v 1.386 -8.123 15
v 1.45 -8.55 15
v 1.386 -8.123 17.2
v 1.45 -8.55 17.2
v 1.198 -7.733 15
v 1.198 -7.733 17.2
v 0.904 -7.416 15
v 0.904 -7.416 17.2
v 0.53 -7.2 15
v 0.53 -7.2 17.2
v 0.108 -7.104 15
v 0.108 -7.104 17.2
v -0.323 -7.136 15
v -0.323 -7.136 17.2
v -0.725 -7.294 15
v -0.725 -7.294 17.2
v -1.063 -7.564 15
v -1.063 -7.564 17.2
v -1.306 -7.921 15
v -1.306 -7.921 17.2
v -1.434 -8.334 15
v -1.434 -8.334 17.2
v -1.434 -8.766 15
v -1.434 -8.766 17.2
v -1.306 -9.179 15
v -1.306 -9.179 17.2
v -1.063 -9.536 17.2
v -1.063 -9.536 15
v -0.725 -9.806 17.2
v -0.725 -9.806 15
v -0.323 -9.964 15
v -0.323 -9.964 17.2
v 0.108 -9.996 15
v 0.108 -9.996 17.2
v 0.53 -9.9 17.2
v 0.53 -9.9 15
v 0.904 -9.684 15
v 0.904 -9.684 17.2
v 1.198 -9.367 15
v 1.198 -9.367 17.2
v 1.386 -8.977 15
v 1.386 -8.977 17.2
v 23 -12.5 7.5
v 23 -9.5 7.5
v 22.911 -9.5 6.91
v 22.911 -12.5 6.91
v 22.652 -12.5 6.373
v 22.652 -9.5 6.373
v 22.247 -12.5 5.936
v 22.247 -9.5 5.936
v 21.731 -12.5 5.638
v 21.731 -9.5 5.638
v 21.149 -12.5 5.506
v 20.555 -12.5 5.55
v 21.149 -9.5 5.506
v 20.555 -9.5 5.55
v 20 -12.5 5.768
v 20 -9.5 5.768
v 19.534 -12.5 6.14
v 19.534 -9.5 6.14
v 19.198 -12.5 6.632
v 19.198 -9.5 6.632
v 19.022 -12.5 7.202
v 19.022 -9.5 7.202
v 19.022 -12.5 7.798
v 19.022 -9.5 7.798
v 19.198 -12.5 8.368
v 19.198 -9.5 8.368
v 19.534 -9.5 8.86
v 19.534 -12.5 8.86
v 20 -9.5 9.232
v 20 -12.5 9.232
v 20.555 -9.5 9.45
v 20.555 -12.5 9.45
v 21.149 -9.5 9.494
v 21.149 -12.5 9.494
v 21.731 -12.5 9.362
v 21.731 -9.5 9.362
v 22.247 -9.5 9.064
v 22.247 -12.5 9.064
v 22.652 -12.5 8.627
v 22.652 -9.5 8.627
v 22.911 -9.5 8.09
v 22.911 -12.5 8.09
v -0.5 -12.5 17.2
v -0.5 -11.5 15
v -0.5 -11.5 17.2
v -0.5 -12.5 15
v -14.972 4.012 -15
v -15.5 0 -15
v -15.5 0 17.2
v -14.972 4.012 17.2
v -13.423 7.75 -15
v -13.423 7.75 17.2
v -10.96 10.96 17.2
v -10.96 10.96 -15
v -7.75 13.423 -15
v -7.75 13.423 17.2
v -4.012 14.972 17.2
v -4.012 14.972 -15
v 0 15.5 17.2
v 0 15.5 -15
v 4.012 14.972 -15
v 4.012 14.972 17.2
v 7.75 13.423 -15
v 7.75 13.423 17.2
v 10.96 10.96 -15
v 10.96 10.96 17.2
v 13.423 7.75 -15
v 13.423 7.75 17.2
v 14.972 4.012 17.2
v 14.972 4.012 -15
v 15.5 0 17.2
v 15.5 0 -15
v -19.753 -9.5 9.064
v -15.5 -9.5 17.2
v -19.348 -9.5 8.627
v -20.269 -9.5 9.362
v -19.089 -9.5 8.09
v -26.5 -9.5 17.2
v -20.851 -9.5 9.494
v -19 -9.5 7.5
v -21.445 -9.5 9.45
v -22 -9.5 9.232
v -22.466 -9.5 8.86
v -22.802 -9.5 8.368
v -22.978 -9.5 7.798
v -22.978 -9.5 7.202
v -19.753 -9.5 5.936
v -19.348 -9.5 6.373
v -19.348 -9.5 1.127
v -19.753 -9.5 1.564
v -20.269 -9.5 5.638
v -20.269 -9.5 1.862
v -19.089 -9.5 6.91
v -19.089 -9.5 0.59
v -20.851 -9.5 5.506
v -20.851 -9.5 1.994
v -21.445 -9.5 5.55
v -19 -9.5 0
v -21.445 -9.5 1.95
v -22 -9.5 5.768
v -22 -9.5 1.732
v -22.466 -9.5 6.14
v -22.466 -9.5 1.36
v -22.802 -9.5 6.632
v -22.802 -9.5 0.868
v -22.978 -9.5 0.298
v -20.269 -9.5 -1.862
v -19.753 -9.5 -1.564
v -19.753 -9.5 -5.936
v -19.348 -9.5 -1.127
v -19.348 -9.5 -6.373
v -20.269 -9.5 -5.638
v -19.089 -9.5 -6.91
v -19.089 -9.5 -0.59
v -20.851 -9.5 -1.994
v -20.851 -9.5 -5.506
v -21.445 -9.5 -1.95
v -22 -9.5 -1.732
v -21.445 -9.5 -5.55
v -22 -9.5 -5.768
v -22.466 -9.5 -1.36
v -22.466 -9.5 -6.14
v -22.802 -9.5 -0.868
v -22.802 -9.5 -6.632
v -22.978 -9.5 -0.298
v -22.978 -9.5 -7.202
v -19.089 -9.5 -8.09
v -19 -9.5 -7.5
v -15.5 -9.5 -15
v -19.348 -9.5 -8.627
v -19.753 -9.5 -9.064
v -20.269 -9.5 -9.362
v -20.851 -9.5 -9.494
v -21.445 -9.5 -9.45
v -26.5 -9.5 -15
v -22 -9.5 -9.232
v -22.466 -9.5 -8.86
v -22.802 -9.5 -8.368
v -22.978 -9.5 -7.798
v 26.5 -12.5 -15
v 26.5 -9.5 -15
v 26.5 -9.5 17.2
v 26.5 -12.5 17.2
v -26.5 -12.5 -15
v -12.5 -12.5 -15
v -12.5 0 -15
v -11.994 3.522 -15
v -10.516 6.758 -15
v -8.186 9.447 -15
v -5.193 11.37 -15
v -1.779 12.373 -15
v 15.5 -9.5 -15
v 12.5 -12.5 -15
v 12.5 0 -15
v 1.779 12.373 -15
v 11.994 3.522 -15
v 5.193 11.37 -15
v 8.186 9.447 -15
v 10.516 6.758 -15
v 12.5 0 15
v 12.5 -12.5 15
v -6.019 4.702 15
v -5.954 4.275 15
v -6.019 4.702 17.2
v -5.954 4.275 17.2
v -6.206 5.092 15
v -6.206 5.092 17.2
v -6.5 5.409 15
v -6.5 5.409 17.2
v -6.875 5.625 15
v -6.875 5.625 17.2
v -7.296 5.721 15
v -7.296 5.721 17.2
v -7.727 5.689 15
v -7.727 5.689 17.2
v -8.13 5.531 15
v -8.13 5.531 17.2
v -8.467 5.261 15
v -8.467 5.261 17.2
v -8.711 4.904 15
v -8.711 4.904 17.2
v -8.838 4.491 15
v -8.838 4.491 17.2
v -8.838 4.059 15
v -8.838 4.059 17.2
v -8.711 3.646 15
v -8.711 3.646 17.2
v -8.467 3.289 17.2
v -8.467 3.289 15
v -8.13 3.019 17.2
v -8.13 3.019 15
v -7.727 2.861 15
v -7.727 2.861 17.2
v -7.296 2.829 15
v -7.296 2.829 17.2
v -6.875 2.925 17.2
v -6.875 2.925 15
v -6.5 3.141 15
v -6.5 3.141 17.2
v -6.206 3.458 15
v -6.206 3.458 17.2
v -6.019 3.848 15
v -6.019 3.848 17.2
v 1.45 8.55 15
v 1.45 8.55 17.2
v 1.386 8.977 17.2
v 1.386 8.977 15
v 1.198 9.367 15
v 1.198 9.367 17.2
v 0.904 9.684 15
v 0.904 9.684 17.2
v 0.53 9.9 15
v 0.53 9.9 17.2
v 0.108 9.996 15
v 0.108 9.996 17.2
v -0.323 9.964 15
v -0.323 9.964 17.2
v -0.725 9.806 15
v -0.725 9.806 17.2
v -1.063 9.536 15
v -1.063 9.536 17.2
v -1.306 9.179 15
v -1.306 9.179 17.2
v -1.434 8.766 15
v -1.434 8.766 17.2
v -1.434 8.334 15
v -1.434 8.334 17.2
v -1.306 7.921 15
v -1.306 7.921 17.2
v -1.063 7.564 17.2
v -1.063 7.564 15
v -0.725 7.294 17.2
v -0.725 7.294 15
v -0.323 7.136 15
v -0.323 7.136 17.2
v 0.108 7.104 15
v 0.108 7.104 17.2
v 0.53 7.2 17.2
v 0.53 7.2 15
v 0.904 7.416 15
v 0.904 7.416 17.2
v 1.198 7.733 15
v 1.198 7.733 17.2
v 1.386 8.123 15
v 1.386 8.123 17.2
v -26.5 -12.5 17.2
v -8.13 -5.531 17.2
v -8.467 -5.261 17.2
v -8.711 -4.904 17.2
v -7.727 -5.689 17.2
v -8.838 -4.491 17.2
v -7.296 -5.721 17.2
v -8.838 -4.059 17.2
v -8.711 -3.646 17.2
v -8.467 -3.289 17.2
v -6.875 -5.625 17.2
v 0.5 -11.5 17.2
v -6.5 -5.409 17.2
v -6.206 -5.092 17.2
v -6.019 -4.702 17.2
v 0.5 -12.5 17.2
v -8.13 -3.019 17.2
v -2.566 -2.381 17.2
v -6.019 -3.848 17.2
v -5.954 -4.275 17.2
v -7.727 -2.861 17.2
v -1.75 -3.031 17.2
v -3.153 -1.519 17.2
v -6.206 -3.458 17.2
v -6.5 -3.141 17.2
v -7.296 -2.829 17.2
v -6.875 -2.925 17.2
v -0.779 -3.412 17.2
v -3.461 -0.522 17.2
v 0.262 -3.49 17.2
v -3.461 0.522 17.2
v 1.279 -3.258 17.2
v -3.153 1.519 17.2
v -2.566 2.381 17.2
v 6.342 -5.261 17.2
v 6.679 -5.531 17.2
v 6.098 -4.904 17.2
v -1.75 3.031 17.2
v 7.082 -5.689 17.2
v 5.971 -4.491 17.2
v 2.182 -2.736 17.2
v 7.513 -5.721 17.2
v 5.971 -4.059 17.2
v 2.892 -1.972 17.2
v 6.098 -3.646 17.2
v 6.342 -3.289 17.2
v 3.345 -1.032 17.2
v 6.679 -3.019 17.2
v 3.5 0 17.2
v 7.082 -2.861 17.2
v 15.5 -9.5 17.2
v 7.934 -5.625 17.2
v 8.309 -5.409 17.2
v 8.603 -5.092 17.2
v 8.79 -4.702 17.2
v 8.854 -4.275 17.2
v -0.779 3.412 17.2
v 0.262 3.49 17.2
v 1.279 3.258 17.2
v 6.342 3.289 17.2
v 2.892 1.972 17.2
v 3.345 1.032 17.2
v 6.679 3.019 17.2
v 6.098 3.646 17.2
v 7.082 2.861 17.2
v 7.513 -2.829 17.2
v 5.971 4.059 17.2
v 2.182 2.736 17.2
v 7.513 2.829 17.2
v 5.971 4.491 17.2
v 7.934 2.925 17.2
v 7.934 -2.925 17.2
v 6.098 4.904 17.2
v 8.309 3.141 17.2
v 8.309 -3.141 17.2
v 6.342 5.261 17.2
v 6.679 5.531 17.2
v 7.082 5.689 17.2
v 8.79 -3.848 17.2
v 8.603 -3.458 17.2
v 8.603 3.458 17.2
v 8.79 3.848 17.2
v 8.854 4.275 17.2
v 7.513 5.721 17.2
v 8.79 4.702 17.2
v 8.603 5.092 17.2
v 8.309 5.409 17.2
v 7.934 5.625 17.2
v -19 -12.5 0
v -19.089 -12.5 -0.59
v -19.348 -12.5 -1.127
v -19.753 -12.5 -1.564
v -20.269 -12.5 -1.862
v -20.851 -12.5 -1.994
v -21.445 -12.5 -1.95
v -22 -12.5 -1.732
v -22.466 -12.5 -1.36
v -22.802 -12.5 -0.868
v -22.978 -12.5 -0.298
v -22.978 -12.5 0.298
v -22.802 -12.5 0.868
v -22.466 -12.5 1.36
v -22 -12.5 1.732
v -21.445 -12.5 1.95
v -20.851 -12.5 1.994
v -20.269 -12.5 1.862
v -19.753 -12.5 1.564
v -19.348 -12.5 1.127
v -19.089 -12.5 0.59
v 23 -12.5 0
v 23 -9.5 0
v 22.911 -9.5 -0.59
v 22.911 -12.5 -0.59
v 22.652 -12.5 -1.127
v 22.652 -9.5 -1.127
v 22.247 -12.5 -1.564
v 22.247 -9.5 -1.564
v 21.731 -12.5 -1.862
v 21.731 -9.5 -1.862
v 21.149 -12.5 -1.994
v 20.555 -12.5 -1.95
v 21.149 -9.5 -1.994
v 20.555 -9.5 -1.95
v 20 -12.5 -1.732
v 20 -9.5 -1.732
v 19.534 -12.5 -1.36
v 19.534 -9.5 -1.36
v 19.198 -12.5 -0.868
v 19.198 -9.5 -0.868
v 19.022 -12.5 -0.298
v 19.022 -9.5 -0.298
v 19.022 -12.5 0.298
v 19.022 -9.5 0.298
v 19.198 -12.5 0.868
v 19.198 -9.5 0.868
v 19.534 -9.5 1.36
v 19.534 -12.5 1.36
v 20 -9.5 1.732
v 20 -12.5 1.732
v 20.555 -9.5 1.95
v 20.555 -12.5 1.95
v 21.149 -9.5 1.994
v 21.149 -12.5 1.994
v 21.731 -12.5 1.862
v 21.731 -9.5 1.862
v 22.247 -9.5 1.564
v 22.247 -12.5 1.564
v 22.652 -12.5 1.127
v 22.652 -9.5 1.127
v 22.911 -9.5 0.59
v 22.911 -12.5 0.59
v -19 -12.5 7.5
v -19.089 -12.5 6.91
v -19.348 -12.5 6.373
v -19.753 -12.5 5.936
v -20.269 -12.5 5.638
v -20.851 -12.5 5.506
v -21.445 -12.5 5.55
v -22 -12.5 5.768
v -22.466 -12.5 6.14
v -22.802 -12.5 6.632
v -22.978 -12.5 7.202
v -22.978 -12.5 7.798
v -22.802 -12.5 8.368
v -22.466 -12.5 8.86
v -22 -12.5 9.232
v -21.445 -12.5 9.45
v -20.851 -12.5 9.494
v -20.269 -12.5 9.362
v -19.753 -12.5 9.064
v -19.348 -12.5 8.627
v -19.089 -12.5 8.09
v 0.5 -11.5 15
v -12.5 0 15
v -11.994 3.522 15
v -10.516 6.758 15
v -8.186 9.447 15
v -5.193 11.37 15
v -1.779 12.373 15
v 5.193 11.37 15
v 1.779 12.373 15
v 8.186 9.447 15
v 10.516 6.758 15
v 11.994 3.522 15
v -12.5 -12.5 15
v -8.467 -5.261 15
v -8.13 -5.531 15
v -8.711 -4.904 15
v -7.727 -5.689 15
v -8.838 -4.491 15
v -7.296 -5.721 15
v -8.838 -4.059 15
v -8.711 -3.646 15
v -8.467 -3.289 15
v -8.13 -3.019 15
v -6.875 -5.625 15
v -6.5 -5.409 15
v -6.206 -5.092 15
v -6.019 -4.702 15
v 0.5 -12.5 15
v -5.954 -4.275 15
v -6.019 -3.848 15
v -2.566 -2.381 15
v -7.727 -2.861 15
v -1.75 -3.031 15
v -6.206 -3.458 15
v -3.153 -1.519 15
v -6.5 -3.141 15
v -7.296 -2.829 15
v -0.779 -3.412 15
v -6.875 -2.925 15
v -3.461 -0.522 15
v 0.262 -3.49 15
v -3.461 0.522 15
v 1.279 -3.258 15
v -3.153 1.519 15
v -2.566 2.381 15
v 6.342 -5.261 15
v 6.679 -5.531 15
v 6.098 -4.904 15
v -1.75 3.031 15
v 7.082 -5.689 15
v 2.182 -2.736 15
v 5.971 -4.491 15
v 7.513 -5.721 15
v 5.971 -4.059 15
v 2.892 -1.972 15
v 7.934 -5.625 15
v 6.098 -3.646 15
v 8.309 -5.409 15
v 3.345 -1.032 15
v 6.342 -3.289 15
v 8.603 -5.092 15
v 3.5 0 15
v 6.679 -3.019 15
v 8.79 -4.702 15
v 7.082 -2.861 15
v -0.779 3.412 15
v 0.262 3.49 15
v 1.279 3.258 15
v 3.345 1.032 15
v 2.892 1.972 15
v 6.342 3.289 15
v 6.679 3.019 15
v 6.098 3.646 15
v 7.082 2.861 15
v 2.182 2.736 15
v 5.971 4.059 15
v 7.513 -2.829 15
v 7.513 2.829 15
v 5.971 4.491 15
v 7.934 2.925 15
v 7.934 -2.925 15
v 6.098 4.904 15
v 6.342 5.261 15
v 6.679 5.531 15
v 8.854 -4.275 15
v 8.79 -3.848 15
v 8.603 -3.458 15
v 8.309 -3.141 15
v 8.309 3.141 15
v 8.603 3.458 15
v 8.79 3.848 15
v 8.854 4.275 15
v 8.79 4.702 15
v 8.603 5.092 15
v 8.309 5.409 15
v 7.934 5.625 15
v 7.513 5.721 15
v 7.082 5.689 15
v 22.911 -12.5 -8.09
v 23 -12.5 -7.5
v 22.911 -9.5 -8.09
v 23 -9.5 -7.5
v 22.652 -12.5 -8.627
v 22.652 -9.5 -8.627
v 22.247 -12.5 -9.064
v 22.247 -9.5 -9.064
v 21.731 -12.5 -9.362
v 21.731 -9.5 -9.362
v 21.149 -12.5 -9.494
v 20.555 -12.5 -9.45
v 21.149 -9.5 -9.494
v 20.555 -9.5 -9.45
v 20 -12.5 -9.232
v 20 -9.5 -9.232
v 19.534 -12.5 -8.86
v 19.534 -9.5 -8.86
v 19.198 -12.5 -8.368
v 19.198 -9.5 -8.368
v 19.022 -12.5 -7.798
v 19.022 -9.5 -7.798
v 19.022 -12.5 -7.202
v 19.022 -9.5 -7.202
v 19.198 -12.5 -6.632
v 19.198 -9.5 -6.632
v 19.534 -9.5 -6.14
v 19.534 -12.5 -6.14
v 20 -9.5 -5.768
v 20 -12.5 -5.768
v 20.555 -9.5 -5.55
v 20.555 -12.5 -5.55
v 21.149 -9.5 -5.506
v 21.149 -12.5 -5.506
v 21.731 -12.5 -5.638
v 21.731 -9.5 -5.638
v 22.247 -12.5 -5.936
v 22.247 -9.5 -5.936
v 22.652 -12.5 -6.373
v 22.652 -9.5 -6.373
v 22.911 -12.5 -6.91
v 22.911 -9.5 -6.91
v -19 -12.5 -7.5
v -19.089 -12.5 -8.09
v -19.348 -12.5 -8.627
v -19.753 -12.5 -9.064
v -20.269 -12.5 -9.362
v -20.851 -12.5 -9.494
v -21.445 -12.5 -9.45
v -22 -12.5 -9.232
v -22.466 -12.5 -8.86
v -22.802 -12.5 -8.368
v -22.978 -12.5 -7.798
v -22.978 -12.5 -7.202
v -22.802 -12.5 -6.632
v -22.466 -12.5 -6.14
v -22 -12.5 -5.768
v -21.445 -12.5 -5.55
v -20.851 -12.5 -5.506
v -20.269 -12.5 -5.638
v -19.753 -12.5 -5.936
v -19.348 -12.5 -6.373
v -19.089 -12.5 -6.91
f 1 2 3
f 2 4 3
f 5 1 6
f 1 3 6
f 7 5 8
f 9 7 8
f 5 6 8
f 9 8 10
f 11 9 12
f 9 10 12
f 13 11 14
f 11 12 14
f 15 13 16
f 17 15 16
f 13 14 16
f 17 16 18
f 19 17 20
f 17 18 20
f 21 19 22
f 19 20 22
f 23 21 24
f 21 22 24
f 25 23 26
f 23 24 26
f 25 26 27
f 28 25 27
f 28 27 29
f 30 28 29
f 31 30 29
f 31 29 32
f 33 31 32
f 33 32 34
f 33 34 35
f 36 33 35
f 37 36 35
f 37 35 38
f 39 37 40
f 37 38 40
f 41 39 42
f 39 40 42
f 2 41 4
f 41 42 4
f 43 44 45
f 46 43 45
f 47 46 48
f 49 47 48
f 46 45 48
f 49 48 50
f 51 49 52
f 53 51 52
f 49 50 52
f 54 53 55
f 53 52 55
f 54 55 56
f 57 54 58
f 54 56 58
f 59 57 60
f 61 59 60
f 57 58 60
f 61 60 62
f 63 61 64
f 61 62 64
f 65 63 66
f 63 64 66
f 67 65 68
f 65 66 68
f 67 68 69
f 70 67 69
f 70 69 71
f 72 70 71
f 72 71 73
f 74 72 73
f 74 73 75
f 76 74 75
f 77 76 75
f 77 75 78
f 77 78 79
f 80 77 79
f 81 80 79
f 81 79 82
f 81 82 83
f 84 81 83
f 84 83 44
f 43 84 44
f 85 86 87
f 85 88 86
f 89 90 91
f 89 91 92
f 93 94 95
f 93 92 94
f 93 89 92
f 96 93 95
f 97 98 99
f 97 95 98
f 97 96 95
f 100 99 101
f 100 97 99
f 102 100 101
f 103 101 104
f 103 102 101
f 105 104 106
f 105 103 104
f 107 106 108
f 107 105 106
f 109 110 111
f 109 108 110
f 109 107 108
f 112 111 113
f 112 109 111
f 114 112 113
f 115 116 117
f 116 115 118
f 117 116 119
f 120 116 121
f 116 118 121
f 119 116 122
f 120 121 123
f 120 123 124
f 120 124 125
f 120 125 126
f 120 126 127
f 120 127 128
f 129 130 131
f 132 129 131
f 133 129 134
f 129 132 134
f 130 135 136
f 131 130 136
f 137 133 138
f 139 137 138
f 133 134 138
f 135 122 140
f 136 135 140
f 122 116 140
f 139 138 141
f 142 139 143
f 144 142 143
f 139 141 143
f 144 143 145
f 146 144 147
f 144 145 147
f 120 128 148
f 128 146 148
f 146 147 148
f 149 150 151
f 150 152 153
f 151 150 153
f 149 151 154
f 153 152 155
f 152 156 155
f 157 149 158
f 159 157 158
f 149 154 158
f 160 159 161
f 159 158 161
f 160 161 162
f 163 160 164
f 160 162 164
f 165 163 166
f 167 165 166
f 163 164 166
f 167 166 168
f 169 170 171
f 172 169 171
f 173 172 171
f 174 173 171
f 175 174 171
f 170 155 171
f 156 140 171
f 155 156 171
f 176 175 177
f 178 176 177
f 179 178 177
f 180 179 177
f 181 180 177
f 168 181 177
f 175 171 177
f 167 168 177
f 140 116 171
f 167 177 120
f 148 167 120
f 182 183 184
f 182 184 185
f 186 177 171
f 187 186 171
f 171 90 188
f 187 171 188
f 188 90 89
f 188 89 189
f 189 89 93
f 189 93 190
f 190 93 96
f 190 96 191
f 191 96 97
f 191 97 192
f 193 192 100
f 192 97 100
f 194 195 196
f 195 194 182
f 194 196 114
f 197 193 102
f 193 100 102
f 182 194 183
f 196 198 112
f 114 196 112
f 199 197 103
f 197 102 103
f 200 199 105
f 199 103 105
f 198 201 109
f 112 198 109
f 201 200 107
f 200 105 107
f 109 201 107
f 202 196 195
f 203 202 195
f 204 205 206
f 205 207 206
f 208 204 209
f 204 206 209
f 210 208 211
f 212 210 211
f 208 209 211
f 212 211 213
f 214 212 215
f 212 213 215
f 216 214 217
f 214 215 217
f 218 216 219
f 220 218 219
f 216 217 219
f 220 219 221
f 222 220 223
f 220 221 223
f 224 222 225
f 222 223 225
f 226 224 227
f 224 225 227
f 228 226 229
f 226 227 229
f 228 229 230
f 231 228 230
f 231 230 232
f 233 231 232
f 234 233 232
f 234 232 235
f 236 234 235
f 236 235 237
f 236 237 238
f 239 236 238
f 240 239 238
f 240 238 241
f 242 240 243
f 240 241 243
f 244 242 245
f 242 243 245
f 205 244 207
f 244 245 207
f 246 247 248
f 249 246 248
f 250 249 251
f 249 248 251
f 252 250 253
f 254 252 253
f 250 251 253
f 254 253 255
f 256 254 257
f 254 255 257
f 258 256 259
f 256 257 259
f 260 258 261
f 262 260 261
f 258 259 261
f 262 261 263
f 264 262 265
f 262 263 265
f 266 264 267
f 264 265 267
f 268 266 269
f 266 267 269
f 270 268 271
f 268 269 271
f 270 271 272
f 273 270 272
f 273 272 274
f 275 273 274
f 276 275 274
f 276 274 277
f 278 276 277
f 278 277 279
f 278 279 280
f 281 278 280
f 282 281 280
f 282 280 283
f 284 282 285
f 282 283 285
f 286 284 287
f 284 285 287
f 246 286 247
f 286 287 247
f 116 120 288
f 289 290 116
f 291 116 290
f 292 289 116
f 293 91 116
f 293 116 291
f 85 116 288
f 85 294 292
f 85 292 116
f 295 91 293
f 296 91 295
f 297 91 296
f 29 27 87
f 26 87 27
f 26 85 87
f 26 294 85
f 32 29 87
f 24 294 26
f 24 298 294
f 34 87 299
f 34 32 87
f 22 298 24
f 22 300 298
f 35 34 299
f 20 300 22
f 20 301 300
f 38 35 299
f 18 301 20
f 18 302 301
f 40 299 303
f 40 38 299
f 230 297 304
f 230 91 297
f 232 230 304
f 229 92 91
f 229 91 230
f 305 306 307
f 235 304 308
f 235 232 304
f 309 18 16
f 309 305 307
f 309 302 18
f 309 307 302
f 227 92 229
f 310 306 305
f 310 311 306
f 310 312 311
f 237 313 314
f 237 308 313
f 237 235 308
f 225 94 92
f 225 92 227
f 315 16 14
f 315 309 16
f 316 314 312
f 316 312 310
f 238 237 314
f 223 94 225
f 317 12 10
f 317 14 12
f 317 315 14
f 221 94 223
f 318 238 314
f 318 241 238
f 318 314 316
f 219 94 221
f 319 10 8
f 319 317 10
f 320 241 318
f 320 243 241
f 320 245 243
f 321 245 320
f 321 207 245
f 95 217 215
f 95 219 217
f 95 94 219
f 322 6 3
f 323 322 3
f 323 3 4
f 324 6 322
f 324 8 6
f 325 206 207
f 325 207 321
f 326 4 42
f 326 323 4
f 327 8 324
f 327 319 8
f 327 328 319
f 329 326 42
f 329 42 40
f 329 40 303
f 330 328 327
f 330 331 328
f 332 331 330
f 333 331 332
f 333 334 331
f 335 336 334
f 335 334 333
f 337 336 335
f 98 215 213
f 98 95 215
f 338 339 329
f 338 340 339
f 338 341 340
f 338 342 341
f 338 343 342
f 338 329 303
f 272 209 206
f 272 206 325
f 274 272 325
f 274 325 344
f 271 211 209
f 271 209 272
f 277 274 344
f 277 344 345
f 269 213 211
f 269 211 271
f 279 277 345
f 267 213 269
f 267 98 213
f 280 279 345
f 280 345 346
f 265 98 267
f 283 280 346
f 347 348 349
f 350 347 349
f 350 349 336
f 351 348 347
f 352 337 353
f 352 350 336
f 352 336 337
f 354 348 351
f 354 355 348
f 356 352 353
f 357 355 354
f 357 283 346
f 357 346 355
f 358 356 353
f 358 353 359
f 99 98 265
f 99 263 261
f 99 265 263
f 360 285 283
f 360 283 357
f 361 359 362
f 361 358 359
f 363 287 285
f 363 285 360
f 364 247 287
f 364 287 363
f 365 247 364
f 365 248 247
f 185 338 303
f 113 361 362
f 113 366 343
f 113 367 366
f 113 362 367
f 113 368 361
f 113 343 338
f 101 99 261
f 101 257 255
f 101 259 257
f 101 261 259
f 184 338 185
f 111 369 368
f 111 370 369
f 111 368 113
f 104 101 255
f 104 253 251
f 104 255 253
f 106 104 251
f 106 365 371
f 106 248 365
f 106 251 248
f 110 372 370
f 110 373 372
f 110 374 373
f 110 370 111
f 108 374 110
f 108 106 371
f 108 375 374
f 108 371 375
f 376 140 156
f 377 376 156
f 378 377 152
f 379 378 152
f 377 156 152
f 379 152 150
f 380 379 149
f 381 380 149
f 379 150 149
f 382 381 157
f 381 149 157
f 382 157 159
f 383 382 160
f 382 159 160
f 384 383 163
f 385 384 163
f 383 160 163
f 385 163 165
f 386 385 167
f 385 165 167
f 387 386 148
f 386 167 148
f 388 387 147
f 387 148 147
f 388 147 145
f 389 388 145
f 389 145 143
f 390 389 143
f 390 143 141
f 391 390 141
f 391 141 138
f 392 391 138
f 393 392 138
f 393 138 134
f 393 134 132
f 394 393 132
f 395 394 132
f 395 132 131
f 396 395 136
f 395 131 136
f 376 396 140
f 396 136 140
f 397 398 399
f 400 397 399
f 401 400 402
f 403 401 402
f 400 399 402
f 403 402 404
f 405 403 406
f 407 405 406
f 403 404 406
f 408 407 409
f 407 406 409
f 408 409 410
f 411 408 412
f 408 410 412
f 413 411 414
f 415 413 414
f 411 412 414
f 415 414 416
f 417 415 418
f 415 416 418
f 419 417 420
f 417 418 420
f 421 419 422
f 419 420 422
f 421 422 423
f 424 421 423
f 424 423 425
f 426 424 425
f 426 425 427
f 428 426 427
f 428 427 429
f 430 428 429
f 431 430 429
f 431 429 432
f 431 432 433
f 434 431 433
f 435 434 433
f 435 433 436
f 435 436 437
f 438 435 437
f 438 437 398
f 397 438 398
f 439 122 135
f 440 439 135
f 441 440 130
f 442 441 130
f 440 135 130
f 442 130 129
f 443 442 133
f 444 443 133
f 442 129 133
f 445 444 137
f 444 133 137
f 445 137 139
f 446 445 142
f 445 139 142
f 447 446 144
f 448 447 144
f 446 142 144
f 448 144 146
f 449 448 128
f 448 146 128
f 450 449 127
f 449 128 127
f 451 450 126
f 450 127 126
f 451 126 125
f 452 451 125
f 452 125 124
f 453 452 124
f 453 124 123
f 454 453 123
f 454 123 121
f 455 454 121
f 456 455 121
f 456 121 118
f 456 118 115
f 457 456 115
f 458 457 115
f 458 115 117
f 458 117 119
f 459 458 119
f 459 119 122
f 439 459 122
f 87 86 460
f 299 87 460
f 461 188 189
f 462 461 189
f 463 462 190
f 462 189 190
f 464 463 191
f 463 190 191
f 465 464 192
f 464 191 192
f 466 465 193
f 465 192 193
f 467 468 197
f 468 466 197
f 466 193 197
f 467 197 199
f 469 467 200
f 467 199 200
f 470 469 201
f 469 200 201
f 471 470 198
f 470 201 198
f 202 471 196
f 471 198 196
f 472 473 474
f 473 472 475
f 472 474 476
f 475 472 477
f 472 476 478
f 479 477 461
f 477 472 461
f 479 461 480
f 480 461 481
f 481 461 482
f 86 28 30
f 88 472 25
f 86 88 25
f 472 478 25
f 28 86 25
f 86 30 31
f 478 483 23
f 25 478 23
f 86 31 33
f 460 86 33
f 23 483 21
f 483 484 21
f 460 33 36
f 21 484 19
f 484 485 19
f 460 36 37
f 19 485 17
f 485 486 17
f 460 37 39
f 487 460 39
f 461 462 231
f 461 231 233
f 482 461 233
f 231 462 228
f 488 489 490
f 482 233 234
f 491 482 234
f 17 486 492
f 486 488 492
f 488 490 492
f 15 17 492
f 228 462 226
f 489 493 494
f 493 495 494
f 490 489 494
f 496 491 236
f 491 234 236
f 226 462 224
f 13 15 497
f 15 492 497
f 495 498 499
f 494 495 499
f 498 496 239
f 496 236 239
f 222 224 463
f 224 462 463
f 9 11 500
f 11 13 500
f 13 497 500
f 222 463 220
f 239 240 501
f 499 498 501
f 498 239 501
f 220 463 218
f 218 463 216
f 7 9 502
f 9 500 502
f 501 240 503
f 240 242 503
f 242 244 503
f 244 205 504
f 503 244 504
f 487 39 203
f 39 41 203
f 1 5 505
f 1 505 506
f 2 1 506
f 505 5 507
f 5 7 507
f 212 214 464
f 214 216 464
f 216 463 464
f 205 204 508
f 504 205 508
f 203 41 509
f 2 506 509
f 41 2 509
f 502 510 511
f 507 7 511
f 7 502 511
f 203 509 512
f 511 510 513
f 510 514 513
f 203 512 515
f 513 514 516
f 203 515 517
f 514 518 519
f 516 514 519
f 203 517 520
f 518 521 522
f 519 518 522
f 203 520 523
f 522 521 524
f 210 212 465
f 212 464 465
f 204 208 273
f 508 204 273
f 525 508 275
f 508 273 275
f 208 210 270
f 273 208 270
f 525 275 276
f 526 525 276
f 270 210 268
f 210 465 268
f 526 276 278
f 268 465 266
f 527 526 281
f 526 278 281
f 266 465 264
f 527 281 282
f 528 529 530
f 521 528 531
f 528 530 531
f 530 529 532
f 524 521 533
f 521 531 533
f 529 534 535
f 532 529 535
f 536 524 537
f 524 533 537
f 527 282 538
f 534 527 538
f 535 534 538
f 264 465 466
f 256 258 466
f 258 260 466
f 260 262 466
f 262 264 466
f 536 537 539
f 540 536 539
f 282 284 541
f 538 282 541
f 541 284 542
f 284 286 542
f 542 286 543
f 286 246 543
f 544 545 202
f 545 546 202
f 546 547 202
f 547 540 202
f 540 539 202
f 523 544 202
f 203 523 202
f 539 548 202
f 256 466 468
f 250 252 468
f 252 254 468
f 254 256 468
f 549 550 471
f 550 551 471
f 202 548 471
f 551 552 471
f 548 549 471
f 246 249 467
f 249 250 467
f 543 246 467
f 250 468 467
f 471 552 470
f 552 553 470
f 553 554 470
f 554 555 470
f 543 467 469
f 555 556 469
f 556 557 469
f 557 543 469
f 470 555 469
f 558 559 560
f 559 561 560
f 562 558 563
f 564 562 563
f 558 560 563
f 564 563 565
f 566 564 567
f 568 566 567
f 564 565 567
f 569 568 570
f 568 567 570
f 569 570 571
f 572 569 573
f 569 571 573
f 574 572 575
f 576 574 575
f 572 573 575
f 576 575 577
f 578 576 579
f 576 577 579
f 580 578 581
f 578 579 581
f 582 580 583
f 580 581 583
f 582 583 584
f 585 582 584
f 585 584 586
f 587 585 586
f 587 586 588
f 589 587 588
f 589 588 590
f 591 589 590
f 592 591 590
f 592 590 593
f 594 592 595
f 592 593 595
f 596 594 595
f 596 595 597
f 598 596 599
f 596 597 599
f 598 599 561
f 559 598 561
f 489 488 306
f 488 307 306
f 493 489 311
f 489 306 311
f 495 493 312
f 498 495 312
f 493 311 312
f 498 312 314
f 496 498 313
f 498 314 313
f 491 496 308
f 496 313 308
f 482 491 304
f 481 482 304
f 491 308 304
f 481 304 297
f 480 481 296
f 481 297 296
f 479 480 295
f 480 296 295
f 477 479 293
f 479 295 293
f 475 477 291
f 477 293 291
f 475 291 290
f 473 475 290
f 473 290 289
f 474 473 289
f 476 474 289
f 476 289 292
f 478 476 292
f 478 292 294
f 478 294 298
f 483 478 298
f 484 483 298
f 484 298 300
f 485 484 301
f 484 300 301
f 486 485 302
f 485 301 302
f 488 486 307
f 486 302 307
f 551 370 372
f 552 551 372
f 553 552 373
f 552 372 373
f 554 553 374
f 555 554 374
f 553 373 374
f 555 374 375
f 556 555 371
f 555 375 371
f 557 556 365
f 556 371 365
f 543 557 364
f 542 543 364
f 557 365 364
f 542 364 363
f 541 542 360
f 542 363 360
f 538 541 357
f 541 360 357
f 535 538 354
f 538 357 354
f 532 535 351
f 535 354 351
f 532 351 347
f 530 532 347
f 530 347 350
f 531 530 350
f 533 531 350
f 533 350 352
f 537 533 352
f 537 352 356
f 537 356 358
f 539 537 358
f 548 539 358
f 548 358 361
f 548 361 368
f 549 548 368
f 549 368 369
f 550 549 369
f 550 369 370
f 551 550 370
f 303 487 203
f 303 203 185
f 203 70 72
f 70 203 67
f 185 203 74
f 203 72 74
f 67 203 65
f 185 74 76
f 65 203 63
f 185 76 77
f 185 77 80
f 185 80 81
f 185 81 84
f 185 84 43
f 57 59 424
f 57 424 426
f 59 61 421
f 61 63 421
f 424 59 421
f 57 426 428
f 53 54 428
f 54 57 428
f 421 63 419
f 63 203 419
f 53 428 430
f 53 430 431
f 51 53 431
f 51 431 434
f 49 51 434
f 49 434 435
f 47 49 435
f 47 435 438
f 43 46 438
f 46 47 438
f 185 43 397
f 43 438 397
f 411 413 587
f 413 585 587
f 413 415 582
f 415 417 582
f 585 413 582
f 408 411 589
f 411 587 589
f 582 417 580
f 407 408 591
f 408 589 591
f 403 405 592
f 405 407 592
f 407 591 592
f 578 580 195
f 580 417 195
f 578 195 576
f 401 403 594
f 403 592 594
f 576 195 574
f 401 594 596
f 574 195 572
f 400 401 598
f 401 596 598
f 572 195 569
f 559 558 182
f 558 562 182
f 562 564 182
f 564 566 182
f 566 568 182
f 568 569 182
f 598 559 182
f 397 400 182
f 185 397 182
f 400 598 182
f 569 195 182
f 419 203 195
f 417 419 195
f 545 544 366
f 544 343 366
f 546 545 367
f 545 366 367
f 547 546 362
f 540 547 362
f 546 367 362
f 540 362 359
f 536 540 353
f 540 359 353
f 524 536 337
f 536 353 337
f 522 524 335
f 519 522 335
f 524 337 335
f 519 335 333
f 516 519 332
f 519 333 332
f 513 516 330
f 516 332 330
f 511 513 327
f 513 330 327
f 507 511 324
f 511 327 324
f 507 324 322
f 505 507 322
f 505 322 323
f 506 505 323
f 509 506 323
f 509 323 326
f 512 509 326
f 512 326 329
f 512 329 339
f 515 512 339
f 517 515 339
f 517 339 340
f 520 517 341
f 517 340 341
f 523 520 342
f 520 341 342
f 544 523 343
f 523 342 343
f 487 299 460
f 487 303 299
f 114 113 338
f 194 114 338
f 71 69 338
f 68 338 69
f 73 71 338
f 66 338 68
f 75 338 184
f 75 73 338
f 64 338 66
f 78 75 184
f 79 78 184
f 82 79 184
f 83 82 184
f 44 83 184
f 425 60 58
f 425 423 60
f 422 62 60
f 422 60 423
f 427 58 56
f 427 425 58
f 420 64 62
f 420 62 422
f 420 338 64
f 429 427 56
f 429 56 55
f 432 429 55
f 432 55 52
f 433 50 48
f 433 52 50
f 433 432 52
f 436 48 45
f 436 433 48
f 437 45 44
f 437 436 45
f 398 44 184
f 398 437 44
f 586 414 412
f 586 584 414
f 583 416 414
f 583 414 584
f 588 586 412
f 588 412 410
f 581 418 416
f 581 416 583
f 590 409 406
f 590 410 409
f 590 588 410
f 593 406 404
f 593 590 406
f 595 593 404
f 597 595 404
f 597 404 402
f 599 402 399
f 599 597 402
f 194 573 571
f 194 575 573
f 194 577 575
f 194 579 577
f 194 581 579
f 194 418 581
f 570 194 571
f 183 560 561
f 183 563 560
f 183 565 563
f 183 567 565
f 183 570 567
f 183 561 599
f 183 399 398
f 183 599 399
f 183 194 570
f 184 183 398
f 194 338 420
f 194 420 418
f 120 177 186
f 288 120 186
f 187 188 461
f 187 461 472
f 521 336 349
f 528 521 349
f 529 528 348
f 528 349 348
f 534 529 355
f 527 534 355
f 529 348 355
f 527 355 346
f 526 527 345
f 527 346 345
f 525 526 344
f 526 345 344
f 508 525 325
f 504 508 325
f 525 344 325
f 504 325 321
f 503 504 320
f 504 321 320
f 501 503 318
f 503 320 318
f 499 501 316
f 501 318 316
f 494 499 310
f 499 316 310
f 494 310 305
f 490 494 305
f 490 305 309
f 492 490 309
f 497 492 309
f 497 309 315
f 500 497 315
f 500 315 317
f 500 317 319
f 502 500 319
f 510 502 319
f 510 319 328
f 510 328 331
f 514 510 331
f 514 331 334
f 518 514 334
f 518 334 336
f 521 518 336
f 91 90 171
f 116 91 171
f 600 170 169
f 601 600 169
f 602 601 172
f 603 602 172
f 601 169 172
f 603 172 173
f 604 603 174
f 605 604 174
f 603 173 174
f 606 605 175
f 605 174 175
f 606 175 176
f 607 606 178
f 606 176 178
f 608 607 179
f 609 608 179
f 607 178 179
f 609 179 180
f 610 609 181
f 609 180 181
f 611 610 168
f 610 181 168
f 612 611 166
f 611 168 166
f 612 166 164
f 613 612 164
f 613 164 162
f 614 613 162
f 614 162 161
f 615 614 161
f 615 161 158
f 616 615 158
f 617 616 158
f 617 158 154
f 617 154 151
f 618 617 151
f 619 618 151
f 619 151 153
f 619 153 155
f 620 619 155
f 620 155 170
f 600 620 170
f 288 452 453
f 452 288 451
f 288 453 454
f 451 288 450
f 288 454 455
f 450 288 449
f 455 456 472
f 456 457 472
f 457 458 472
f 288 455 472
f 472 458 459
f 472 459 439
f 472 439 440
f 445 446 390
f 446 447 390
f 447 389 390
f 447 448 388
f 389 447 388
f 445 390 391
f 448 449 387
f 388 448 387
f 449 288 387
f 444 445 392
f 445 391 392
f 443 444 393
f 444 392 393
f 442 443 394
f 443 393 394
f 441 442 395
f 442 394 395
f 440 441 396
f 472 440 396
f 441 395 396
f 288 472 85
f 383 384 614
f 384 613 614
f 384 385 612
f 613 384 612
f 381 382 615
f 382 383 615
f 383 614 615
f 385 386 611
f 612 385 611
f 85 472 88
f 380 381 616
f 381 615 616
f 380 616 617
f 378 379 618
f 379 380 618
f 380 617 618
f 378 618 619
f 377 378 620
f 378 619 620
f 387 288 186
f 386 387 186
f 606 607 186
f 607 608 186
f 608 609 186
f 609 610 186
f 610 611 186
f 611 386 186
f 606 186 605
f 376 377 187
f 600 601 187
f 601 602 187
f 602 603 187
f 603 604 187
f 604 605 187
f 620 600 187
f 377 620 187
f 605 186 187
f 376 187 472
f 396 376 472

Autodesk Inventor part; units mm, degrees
ref_plane "YZ Plane" through (0, 0, 0) normal (1, 0, 0) x (0, 1, 0)
ref_plane "XZ Plane" through (0, 0, 0) normal (0, 1, 0) x (-1, 0, 0)
ref_plane "XY Plane" through (0, 0, 0) normal (0, 0, 1) x (1, 0, 0)
sketch "Эскиз1" plane through (0, 0, 0) normal (0, 0, 1) x (1, 0, 0)
  arc A0 (12.5, 0) -> (-12.5, 0) centre (0, 0) ccw
  line L0 (-14, -15) -> (14, 15) construction
  line L1 (14, -15) -> (-14, 15) construction
  line L2 (-14, 0) -> (14, 0) construction
  line L3 (-12.5, 0) -> (-12.5, -12.5)
  line L4 (12.5, 0) -> (12.5, -12.5)
  line L5 (-14, -12.5) -> (-12.5, -12.5)
  line L6 (12.5, -12.5) -> (14, -12.5)
  arc A1 (-12.5, 0) -> (12.5, 0) centre (0, 0) ccw construction
  line L7 (-16.5, 17.6786) -> (16.5, -17.6786) construction
  line L8 (16.5, 17.6786) -> (-16.5, -17.6786) construction
  line L9 (-16.5, -12.5) -> (-12.5, -12.5)
  line L10 (12.5, -12.5) -> (16.5, -12.5)
  arc A2 (-12.2571, 13.1326) -> (-12.5, 12.8766) centre (-1.5, 2.6786) ccw
  line L11 (16.5, -12.5) -> (26.5, -12.5)
  line L12 (0, 24.347) -> (0, -20.4254) construction
  line L13 (-16.5, -12.5) -> (-26.5, -12.5)
  line L14 (-15.5, -9.5) -> (-15.5, 0)
  arc A3 (15.5, 0) -> (-15.5, 0) centre (0, 0) ccw
  line L15 (15.5, 0) -> (15.5, -9.5)
  line L16 (-12.5, -12.5) -> (-12.5, -9.5)
  line L17 (-26.5, -12.5) -> (-12.5, -12.5)
  line L18 (-12.5, -12.5) -> (-12.5, -9.5)
  line L19 (-15.5, -9.5) -> (-26.5, -9.5)
  line L20 (-26.5, -9.5) -> (-26.5, -12.5)
  line L21 (12.5, -12.5) -> (26.5, -12.5)
  line L22 (26.5, -12.5) -> (26.5, -9.5)
  line L23 (26.5, -9.5) -> (15.5, -9.5)
  line L24 (12.5, -9.5) -> (12.5, -12.5)
  point P0 (0, 17.6786)
  dimension "d0" = 25
  dimension "d5" = 15
  dimension "d38" = 3
  dimension "d39" = 3
extrude "Выдавливание1" add sketch "Эскиз1" along normal mid plane 30
sketch "Эскиз7" plane through (-26.5, -9.5, 15) normal (0, 1, 0) x (1, 0, 0)
  line L0 (0, 15) -> (11, 15) construction
  line L1 (11, 30) -> (11, 0) construction
  line L2 (5.5, 0) -> (5.5, 30) construction
  line L3 (0, 30) -> (11, 30) construction
  line L4 (0, 7.5) -> (11, 7.5) construction
  line L5 (0, 22.5) -> (11, 22.5) construction
  circle A0 centre (5.5, 7.5) radius 2
  line L6 (0, 0) -> (0, 30)
  line L7 (0, 30) -> (0, 0) projected
  circle A1 centre (5.5, 15) radius 2
  circle A2 centre (5.5, 22.5) radius 2
  line L8 (26.5, 38.2442) -> (26.5, 0)
  line L9 (53, 15) -> (42, 15) construction
  line L10 (42, 30) -> (42, 0) construction
  line L11 (47.5, 0) -> (47.5, 30) construction
  line L12 (53, 30) -> (42, 30) construction
  line L13 (53, 7.5) -> (42, 7.5) construction
  line L14 (53, 22.5) -> (42, 22.5) construction
  circle A3 centre (47.5, 7.5) radius 2
  circle A4 centre (47.5, 15) radius 2
  circle A5 centre (47.5, 22.5) radius 2
  point P0 (26.5, 15)
  dimension "d40" = 4
  dimension "d41" = 4
  dimension "d42" = 4
extrude "Выдавливание7" cut sketch "Эскиз7" against normal blind 10
sketch "Эскиз8" plane through (0, 0, 15) normal (0, 0, 1) x (1, 0, 0)
  line L0 (-15.5, -9.5) -> (15.5, -9.5)
split_face "Разделение1"
sketch "Эскиз9" plane through (0, 0, 15) normal (0, 0, 1) x (1, 0, 0)
  arc A0 (15.5, 0) -> (-15.5, 0) centre (0, 0) ccw
  line L0 (-15.5, 0) -> (-15.5, -9.5)
  line L1 (15.5, 0) -> (15.5, -9.5)
  line L2 (12.5, -12.5) -> (26.5, -12.5) projected
  line L3 (-15.5, -9.5) -> (-26.5, -9.5)
  line L4 (-26.5, -9.5) -> (-26.5, -12.5)
  line L5 (-26.5, -12.5) -> (-12.5, -12.5)
  line L6 (15.5, -9.5) -> (26.5, -9.5)
  line L7 (26.5, -9.5) -> (26.5, -12.5)
  line L8 (-12.5, -12.5) -> (12.5, -12.5)
  point P0 (-12.5, 0)
  point P1 (12.5, 0)
  point P2 (-12.5, -9.5)
extrude "Выдавливание8" add sketch "Эскиз9" along normal blind 2.2
sketch "Эскиз10" plane through (0, 0, 17.2) normal (0, 0, 1) x (1, 0, 0)
  arc A0 (12.5, 0) -> (-12.5, 0) centre (0, 0) ccw projected
  line L0 (12.5, 0) -> (12.5, -12.5) projected
  line L1 (-12.5, -12.5) -> (-12.5, 0) projected
  circle A1 centre (0, 0) radius 12.5 construction
  circle A2 centre (0, 0) radius 3.5
  line L2 (0, 12.5) -> (0, 10) construction
  line L3 (0, 10) -> (0, 7.1) construction
  circle A3 centre (0, 8.55) radius 1.45
  line L4 (-12.5, 0) -> (12.5, 0) construction
  circle A4 centre (-7.4045, 4.275) radius 1.45
  circle A5 centre (-7.4045, -4.275) radius 1.45
  circle A6 centre (0, -8.55) radius 1.45
  circle A7 centre (7.4045, -4.275) radius 1.45
  circle A8 centre (7.4045, 4.275) radius 1.45
  point P0 (-8.6603, 5)
  point P1 (-8.6603, -5)
  point P2 (0, -10)
  point P3 (8.6603, -5)
  point P4 (8.6603, 5)
  dimension "d47" = 7
  dimension "d48" = 2.5
  dimension "d49" = 2.9
  dimension "d52" = 360
extrude "Выдавливание9" cut sketch "Эскиз10" against normal blind 3
sketch "Эскиз11" plane through (-26.5, -12.5, -15) normal (0, -1, 0) x (1, 0, 0)
  line L0 (0, 32.2) -> (53, 32.2) projected
  line L1 (26.5, 32.2) -> (26.5, 30)
  line L2 (30, 30) -> (23, 30) projected
  line L3 (27, 30) -> (26, 30)
  line L4 (26, 30) -> (26, 32.2)
  line L5 (26, 32.2) -> (27, 32.2)
  line L6 (27, 32.2) -> (27, 30)
  line L7 (27, 30) -> (26, 32.2) construction
  line L8 (26, 30) -> (27, 32.2) construction
  point P0 (26.5, 15)
  point P1 (26.5, 31.1)
  dimension "d56" = 1
extrude "Выдавливание10" cut sketch "Эскиз11" against normal blind 1
sketch "Эскиз12" plane through (0, 0, 17.2) normal (0, 0, 1) x (1, 0, 0)
  arc A0 (15.5, 0) -> (-15.5, 0) centre (0, 0) ccw construction
  line L0 (0, 15.5) -> (0, -12.7683) construction
properties part number "Mount gor motor TR"
